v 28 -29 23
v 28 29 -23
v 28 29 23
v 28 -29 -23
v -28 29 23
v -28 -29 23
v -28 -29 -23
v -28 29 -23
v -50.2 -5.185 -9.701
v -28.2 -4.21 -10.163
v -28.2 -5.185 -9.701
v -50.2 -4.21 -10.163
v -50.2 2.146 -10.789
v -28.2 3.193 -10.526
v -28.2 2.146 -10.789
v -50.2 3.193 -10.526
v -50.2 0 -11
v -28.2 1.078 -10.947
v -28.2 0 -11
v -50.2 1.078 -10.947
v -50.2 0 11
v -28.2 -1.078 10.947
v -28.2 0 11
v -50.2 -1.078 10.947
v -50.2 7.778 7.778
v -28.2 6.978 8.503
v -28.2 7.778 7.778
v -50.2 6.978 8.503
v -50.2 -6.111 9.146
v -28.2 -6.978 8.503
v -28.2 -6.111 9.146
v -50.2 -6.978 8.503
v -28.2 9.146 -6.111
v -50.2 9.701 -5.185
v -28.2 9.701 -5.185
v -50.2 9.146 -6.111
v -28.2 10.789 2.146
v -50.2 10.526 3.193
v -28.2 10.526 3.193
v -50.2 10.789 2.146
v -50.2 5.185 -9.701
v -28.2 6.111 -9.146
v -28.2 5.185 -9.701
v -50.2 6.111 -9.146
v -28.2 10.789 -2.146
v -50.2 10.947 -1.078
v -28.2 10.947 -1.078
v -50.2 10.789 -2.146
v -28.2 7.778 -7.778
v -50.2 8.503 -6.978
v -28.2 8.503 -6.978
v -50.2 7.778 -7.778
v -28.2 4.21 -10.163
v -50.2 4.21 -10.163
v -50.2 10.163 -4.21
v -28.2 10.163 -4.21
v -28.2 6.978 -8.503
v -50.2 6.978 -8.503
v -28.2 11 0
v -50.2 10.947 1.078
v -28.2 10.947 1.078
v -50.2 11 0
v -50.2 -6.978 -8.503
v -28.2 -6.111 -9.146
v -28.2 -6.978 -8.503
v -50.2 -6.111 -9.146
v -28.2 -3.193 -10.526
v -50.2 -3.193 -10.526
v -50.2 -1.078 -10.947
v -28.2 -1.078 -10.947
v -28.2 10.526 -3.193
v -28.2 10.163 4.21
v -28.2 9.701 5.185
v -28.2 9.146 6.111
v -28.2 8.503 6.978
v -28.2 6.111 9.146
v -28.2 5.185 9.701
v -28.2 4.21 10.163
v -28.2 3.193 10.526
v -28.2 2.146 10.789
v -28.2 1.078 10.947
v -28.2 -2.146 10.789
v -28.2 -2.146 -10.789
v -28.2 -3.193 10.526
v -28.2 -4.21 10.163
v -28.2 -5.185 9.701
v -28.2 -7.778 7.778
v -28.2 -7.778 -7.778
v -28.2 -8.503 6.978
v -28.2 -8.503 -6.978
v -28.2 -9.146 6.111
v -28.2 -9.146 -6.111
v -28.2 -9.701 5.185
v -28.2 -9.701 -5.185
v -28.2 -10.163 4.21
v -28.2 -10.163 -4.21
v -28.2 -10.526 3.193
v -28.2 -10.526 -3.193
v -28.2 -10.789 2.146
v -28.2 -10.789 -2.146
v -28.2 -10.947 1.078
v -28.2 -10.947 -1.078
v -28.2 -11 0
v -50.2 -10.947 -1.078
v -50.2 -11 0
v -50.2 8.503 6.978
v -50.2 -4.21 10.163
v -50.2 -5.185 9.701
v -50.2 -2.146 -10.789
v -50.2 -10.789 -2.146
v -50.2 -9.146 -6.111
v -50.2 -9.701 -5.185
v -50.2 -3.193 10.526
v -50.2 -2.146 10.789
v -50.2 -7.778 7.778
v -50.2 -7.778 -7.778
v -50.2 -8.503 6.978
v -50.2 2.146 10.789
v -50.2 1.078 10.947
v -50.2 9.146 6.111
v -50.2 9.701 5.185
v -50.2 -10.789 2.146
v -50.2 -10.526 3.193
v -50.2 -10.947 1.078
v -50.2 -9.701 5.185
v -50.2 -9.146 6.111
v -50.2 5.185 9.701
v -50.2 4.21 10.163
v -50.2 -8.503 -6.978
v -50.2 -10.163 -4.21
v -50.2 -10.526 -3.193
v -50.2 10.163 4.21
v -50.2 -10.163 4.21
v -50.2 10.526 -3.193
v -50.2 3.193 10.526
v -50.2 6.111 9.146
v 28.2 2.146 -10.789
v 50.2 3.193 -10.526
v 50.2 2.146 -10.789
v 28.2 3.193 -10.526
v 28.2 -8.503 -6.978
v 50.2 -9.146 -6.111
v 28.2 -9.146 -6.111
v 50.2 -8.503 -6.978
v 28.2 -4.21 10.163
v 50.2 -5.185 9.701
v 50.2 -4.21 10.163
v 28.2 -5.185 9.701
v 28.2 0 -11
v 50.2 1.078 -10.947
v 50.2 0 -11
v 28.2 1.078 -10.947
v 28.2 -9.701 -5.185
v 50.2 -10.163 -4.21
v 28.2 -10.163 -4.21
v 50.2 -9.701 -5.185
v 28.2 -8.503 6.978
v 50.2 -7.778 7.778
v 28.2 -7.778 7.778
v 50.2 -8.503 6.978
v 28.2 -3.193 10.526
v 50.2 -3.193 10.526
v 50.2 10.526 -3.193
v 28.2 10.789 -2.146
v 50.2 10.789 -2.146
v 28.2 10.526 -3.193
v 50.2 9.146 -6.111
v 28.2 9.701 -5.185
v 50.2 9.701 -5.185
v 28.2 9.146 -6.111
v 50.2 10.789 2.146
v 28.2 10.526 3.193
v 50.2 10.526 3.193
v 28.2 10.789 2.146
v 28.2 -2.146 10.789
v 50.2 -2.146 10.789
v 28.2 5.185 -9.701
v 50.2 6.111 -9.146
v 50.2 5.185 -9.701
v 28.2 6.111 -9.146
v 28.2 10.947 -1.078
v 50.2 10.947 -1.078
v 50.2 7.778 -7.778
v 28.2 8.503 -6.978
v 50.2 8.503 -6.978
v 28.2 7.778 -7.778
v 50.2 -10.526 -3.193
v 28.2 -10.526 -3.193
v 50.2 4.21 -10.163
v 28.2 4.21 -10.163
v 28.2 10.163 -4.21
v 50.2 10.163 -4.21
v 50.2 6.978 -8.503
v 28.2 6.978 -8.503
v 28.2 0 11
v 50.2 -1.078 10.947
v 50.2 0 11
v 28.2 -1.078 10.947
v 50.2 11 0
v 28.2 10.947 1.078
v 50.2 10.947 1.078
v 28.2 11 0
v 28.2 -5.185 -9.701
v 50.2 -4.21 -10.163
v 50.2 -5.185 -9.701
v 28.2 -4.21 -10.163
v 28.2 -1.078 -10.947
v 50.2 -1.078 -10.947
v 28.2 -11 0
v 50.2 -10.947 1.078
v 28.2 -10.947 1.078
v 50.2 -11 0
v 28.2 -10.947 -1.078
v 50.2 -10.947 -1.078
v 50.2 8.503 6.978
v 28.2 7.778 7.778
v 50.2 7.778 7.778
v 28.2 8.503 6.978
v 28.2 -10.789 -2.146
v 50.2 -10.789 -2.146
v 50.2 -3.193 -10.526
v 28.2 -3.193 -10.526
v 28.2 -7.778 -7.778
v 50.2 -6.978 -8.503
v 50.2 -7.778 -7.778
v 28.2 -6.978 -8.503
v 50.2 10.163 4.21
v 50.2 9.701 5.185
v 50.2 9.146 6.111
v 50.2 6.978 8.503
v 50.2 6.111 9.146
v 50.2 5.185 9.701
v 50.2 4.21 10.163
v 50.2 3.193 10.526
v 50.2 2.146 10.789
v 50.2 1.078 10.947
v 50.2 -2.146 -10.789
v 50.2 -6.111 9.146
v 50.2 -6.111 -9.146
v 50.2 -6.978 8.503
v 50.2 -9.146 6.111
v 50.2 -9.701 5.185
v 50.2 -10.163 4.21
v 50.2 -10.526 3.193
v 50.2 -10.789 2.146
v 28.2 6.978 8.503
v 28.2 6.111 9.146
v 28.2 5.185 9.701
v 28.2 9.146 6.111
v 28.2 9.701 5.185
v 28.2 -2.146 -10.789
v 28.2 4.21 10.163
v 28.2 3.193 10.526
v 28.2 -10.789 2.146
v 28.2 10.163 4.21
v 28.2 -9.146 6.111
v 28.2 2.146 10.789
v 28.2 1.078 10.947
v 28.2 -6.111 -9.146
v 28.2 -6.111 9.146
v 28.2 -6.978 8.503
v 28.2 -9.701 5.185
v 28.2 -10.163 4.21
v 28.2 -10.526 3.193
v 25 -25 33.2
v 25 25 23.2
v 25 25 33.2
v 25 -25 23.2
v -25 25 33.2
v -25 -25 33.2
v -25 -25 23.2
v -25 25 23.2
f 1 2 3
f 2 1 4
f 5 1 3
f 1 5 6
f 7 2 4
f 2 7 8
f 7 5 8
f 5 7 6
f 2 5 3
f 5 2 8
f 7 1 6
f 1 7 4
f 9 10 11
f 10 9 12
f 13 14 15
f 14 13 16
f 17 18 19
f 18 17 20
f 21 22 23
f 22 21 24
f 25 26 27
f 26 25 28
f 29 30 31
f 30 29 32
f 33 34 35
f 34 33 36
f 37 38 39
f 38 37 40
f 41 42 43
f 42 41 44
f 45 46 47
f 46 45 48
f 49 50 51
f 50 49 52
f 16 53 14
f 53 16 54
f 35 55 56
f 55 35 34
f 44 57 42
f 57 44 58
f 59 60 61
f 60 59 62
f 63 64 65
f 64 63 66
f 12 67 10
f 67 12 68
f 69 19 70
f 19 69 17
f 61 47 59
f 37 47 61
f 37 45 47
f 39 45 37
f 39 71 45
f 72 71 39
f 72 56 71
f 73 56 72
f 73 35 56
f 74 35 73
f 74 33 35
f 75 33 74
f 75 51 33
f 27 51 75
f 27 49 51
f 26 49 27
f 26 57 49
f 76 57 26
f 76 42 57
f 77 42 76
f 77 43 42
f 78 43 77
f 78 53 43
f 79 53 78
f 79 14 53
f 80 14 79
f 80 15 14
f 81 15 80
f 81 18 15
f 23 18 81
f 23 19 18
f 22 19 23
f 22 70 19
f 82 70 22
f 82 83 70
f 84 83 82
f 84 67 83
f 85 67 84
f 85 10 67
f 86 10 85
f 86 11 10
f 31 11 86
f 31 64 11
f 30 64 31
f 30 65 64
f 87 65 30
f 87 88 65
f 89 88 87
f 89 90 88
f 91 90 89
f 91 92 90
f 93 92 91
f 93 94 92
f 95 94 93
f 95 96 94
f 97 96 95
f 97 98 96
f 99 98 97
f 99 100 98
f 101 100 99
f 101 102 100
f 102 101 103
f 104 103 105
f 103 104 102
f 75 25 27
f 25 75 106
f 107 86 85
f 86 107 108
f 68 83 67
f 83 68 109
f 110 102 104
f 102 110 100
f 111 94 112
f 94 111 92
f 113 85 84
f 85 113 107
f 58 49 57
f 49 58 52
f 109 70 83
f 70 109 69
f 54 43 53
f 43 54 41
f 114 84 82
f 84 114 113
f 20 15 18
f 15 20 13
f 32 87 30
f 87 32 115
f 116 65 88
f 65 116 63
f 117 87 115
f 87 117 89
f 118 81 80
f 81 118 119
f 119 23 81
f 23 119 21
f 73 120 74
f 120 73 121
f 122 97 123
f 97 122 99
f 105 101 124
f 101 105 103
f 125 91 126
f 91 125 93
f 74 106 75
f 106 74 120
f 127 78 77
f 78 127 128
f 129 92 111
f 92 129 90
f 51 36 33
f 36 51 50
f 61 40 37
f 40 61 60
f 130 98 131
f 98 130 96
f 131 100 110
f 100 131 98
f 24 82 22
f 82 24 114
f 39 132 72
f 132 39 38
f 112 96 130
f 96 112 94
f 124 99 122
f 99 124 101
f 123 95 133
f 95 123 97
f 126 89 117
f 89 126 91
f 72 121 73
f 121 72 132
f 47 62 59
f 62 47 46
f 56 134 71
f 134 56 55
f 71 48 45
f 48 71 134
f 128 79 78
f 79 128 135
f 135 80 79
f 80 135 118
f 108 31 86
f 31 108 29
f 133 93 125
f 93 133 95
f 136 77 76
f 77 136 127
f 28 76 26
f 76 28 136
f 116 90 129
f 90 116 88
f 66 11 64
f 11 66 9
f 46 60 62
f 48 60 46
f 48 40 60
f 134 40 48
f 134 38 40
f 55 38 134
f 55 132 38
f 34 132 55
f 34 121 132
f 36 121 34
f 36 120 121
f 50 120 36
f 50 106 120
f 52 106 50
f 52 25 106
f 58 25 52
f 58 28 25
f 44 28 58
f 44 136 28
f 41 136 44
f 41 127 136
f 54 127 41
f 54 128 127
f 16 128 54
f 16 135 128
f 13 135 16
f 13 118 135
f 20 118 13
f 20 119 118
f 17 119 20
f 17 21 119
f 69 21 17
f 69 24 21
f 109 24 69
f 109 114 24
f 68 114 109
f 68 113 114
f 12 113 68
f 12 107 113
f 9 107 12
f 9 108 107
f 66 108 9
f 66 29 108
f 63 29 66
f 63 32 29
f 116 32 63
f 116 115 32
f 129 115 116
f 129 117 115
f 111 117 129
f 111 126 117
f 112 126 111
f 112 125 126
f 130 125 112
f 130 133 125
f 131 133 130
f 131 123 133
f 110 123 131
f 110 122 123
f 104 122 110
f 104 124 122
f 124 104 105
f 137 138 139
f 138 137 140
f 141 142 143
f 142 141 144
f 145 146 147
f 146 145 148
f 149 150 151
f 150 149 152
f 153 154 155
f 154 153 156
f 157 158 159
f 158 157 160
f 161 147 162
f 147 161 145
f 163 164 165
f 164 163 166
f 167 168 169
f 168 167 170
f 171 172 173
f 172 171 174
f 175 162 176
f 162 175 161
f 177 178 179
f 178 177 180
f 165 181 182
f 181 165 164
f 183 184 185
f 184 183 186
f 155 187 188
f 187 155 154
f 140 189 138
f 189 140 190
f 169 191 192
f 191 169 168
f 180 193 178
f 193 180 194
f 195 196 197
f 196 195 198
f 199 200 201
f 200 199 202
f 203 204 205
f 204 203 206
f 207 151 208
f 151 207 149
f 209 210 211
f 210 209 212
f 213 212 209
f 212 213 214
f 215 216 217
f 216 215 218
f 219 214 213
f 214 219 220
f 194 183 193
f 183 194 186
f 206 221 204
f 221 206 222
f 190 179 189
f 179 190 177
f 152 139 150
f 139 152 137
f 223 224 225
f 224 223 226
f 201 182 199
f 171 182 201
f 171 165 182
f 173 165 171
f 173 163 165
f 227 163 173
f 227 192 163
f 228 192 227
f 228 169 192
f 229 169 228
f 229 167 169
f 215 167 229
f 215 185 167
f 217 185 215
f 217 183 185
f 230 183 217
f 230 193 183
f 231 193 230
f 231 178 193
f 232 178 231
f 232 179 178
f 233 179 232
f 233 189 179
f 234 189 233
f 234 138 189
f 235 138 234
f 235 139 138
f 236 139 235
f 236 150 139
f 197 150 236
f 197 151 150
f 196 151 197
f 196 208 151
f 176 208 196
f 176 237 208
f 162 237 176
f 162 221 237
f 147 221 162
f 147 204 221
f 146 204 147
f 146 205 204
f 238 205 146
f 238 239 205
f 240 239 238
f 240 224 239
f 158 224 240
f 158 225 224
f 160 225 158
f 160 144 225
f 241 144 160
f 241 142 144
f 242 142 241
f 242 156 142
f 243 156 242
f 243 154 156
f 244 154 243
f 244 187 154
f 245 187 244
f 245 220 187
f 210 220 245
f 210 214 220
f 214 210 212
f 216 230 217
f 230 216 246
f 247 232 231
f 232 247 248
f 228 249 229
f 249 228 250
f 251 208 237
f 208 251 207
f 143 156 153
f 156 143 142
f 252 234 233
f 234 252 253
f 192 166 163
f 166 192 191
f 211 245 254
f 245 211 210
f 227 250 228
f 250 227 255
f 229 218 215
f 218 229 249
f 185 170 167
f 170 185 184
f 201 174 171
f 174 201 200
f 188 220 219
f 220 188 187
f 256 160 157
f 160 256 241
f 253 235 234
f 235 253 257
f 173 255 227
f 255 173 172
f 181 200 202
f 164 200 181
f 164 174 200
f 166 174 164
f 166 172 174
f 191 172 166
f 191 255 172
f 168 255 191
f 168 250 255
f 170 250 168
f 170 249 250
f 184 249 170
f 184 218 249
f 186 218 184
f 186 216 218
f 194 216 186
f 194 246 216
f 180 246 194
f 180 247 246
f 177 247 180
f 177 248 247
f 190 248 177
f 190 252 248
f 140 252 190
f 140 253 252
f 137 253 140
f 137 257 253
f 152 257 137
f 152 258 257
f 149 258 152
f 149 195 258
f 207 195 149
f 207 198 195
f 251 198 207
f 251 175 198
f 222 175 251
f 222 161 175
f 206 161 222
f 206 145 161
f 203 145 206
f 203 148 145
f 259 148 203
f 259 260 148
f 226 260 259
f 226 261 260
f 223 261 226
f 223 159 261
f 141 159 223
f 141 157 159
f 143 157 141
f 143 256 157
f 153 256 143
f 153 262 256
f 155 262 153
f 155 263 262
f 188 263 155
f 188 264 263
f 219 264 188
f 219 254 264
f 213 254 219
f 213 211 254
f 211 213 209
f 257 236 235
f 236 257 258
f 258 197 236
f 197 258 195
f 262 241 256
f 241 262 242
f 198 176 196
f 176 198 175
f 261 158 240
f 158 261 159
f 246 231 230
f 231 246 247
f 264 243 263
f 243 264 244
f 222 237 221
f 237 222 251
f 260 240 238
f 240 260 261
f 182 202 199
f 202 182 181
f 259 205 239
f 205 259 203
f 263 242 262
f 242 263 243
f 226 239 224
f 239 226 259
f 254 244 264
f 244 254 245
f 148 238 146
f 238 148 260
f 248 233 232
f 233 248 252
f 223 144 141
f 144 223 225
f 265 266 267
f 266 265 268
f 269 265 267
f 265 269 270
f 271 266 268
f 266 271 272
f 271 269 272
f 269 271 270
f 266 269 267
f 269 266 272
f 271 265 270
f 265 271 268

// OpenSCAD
// ============================================================================
// Atom Lithography Machine — Parametric OpenSCAD Module (S5.5-03)
// ============================================================================
// part_id           : S5.5-03
// parent_bom_id     : S5.5
// subsystem         : S5
// part_name         : Dikroik ustu 10 us iki-renkli InGaAs/Si pirometre ve ±1.5% kapali-cevrim enerji integratori (Exp130)
// material          : Al 6061
// temp_stage        : 300 K
// vacuum_grade      : Atmosfer (optik)
// tolerance         : ±1.5% enerji / 10 us
// computed_mass_kg  : 0.32739
// envelope_mm       : 100.400 x 58.000 x 56.200
// design_maturity   : M0_M1_DETAILED_CAD_DESIGN_ONLY
// no_lab_measurement: true
// iec61508_certified: false
// semi_s2_certified : false
// Units: millimeters (mm)
// ============================================================================

$fn = 64;

// Nominal bounding envelope parameters (mm)
bbox_x = 100.4000;
bbox_y = 58.0000;
bbox_z = 56.2000;

// Part-specific parametric dimensions
dt_us = 10.0;
dichroic_deg = 45.0;
energy_tol_pct = 1.5;

// Interface / port parameters (mm)
port_optical_tap_in_bore = 28.000;

module part_S5_5_03() {
  union() {
    // 45 deg dichroic beam-splitter turret cube
    cube([56.000, 58.000, 46.000], center=true);
    // 45 deg dichroic mirror element
    rotate([0.000, 45.000, 0.000]) cylinder(d=30.000, h=3.000, center=true);
    // InGaAs 10 us fast photodiode barrel
    translate([-39.200, 0.000, 0.000]) rotate([0.000, 90.000, 0.000]) cylinder(d=22.000, h=22.000, center=true);
    // Si 10 us fast photodiode barrel
    translate([39.200, 0.000, 0.000]) rotate([0.000, 90.000, 0.000]) cylinder(d=22.000, h=22.000, center=true);
    // Closed-loop +/-1.5% energy integrator FPGA
    translate([0.000, 0.000, 28.200]) cube([50.000, 50.000, 10.000], center=true);
  }
}

// World assembly mounting transform (global machine frame, mm / deg):
// translate([0.000, 385.000, 568.500]) rotate([0.000, 0.000, 0.000]) part_S5_5_03();

part_S5_5_03();
